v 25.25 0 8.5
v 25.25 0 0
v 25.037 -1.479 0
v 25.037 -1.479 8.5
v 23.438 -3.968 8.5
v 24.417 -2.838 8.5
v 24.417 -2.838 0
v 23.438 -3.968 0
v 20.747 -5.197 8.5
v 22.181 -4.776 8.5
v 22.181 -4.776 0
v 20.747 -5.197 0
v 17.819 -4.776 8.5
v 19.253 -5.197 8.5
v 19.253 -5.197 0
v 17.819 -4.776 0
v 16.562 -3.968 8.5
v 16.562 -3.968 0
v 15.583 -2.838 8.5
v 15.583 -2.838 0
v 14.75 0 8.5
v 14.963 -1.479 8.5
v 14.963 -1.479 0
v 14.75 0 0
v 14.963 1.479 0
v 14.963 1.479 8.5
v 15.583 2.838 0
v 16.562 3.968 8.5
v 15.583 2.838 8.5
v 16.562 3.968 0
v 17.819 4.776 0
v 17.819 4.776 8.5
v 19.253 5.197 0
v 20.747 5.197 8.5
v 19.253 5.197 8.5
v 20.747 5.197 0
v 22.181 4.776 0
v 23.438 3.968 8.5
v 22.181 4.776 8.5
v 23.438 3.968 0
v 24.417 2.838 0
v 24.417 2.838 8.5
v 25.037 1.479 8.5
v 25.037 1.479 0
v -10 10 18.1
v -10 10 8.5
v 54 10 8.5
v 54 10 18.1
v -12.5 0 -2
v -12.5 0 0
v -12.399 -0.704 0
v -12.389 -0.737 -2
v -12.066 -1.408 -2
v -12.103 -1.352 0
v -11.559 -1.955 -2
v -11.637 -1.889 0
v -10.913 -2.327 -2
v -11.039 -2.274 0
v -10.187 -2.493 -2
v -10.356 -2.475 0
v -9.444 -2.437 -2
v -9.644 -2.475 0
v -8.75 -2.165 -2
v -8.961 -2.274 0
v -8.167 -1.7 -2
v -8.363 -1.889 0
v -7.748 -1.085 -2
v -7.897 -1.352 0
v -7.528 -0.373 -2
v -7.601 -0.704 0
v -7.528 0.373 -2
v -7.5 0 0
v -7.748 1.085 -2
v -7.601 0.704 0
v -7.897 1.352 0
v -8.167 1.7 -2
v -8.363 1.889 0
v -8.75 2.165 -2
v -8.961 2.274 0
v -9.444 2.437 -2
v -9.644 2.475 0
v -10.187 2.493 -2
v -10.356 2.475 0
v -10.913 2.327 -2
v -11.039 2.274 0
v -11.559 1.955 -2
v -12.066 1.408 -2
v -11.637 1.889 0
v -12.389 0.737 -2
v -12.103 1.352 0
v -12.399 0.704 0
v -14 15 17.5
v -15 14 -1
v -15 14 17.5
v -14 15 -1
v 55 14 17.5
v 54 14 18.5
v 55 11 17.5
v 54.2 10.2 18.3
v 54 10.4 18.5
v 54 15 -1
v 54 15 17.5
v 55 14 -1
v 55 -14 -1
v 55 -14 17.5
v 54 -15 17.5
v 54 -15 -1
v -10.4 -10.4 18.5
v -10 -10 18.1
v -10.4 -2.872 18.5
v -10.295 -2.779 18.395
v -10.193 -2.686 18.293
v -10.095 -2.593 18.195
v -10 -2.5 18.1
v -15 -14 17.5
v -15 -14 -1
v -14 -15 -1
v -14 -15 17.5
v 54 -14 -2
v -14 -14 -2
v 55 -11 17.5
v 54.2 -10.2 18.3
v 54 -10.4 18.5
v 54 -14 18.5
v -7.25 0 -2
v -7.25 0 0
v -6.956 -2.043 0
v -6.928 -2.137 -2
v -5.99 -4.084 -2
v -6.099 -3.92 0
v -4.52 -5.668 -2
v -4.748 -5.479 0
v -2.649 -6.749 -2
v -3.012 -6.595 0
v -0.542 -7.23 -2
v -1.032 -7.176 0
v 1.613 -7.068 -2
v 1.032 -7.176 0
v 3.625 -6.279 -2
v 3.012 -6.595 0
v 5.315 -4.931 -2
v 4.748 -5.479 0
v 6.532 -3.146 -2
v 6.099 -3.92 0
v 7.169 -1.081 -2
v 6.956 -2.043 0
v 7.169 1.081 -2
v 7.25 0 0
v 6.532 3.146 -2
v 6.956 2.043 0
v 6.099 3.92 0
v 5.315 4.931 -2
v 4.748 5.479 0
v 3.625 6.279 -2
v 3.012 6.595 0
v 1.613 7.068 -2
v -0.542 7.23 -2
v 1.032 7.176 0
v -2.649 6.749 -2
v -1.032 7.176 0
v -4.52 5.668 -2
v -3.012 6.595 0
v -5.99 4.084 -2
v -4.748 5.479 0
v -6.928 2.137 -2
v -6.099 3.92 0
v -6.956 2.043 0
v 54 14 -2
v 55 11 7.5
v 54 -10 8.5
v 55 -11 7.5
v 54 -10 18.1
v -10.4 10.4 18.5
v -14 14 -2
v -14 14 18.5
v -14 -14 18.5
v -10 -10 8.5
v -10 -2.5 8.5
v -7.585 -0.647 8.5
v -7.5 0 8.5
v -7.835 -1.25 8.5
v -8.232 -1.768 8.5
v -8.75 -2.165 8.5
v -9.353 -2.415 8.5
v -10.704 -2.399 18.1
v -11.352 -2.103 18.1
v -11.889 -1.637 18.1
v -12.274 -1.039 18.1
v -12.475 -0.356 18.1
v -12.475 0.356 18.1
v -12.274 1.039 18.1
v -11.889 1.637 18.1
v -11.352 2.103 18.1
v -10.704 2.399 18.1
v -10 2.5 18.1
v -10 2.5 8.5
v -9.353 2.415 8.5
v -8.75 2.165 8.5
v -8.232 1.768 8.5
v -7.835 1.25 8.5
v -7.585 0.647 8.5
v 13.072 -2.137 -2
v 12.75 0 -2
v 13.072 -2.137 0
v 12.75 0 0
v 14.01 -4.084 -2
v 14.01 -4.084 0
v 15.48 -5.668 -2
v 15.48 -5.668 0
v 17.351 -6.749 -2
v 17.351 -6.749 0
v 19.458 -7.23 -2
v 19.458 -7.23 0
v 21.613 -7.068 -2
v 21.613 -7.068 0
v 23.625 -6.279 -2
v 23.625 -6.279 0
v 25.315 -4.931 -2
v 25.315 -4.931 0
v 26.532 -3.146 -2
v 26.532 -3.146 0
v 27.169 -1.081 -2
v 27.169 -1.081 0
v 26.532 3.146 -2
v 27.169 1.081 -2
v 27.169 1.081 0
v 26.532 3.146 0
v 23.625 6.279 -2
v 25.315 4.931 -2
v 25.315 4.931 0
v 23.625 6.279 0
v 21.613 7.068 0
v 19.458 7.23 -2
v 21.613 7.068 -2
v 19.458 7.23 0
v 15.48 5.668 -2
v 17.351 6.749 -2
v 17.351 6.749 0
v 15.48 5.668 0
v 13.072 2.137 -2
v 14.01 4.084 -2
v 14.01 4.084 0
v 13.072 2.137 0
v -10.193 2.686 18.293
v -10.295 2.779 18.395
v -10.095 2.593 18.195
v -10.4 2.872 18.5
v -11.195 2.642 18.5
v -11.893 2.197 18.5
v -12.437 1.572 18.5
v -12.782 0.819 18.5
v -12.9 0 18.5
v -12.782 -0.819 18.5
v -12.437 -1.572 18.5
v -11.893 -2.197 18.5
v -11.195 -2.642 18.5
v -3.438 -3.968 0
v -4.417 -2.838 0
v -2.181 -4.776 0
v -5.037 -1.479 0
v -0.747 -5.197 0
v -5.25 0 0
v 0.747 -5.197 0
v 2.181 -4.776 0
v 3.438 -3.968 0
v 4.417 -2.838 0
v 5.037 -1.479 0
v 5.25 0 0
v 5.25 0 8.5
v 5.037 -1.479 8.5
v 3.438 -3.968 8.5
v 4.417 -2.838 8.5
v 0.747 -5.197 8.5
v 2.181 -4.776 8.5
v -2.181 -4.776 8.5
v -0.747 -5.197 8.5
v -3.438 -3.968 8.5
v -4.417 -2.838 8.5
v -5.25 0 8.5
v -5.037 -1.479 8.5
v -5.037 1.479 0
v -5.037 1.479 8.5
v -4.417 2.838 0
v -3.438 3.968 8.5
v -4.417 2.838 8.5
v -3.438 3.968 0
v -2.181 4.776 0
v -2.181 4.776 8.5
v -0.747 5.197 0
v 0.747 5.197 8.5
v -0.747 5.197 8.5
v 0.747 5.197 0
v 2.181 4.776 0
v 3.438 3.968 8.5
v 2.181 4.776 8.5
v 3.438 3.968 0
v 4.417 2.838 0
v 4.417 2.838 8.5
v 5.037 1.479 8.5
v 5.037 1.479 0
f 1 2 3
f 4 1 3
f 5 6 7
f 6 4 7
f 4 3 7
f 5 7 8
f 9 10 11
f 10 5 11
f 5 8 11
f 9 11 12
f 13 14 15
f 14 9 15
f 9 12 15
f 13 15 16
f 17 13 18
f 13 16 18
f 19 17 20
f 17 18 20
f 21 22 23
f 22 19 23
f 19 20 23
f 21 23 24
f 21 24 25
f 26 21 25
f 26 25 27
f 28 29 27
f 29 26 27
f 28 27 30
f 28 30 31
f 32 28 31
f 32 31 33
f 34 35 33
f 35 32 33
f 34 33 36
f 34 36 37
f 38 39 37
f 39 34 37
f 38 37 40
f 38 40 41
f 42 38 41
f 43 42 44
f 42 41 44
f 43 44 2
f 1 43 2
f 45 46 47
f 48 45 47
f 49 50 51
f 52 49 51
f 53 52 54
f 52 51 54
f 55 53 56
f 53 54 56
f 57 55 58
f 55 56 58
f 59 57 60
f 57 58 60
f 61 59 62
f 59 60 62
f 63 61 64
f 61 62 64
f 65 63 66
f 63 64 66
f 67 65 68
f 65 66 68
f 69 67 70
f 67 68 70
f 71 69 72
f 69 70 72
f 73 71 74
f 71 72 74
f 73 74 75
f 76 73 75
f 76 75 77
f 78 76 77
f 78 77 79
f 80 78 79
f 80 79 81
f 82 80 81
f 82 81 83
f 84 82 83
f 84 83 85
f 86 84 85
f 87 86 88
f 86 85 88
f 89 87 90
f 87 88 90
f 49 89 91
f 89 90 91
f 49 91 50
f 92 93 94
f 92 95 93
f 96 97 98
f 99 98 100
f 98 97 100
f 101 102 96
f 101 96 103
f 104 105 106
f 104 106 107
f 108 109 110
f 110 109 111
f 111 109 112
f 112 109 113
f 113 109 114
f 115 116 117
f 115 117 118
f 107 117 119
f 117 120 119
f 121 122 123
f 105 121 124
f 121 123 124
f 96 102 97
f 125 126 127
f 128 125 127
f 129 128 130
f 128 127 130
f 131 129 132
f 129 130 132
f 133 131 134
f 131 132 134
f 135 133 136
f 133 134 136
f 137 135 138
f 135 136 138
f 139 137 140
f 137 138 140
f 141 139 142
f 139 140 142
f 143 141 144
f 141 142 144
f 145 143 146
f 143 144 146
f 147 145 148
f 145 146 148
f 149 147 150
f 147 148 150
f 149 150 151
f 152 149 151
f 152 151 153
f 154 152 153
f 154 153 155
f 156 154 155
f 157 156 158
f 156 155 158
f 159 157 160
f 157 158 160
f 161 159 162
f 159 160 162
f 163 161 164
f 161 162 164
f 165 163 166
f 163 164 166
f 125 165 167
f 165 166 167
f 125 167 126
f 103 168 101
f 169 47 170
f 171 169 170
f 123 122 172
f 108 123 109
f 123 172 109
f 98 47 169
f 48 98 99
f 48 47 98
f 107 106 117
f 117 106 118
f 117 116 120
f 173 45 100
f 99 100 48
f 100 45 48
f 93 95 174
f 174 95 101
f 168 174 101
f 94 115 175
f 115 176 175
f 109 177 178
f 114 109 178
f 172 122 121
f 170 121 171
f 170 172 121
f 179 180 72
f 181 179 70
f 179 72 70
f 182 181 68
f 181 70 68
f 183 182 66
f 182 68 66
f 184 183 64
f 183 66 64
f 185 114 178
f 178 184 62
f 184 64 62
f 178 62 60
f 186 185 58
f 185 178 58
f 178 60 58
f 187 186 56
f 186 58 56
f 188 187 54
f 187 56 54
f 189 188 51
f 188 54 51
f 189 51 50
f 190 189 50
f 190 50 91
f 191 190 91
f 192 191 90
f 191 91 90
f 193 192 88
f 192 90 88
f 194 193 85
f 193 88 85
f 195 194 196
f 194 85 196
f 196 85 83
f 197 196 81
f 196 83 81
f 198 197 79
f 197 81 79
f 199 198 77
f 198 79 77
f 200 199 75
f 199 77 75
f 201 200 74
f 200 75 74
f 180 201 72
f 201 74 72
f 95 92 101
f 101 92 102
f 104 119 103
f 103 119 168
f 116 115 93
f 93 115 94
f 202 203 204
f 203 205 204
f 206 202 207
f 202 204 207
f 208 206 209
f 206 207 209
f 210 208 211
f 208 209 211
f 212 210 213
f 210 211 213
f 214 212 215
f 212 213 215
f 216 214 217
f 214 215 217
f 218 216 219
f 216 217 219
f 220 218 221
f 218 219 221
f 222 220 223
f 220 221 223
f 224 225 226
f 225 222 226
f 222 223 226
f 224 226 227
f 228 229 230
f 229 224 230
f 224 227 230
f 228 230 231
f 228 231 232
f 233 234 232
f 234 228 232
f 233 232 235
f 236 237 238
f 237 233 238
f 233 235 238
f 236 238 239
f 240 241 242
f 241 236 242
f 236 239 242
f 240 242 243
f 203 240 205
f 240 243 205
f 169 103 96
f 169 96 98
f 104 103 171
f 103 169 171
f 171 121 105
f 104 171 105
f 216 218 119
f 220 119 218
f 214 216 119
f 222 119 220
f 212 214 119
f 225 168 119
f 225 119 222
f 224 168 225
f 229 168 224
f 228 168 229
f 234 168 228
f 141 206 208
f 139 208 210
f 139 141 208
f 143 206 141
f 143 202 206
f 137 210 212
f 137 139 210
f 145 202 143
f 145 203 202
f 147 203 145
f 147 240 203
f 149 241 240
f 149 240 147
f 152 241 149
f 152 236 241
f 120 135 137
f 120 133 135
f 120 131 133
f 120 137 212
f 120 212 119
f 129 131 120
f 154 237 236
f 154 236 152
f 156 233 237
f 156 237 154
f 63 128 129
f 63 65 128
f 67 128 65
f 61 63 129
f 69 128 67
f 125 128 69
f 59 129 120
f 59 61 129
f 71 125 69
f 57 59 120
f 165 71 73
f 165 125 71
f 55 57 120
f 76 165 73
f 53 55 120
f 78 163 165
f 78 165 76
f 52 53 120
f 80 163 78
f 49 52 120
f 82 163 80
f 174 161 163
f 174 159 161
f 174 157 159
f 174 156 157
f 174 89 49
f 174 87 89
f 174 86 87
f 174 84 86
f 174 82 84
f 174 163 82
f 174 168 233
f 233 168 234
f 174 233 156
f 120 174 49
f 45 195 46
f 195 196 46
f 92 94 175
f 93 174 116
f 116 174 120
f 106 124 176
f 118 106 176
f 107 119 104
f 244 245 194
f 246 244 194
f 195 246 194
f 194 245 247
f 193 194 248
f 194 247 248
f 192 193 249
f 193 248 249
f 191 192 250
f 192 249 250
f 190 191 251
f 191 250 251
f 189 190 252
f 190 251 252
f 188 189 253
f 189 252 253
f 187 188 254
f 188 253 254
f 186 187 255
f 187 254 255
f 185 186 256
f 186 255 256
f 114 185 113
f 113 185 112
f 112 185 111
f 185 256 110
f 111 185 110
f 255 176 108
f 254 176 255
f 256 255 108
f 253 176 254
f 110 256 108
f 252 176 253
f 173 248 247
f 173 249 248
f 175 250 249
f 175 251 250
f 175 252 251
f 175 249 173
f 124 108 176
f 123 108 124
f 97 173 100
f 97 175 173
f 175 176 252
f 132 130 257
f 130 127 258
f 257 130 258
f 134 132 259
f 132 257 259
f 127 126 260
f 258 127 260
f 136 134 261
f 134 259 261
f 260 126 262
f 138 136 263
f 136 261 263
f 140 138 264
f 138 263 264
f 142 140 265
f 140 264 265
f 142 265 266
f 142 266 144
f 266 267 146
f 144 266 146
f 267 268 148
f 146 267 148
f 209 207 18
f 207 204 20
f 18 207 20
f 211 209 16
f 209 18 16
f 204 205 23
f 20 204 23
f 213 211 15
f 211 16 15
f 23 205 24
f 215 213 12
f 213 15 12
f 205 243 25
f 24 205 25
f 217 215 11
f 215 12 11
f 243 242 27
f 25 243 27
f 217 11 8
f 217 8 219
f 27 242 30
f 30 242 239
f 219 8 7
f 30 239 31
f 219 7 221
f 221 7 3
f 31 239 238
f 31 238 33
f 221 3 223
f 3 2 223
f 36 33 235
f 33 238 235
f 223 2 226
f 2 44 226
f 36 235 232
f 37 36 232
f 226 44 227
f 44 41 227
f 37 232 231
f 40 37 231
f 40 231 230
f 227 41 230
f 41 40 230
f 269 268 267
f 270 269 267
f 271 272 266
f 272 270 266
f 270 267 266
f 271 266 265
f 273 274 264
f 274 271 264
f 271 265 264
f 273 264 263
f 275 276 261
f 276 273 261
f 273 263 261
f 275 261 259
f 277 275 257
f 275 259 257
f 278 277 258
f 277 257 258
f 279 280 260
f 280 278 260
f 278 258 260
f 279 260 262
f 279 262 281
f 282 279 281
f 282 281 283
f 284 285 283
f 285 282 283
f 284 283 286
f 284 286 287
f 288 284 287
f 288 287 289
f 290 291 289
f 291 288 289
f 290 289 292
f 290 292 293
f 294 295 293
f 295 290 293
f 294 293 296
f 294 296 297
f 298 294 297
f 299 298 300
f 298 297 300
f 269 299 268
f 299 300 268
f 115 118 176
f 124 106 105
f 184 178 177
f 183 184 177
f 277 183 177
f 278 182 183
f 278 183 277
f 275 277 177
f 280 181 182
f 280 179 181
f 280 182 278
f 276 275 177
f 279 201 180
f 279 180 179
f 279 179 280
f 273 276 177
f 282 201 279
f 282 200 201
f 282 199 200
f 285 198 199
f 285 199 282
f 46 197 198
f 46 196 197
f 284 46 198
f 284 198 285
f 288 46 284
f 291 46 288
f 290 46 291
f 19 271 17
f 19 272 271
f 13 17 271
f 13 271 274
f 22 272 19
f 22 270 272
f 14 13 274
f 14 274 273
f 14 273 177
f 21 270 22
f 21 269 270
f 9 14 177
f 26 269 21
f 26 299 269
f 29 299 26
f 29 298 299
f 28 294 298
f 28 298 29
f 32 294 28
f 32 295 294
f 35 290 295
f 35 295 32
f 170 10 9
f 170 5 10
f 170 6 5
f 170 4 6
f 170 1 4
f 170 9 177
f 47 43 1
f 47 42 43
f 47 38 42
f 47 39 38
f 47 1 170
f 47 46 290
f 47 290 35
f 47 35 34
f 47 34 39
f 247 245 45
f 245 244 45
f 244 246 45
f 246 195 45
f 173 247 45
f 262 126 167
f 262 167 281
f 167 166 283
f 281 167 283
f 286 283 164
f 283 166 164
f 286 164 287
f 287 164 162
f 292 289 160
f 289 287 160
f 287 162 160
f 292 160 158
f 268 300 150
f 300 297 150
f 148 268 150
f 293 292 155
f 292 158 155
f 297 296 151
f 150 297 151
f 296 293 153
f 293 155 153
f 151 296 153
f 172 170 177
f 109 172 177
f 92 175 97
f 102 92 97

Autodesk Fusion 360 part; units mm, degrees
sketch "Sketch1" plane through (0, 0, 0) normal (0, 0, 1) x (1, 0, 0)
  circle A0 centre (0, 0) radius 5.25
  line L0 (0, 0) -> (20, 0)
  circle A1 centre (20, 0) radius 5.25
  line L1 (0, 0) -> (-15, 0)
  line L2 (-15, 0) -> (-15, 15)
  line L3 (-15, 0) -> (-15, -15)
  line L4 (-15, -15) -> (55, -15)
  line L5 (-15, 15) -> (55, 15)
  line L6 (55, 15) -> (55, -15)
  circle A2 centre (-10, 0) radius 2.5
  dimension "d1" = 10.5
  dimension "d2" = 20
  dimension "d3" = 10.5
  dimension "d4" = 15
  dimension "d5" = 15
  dimension "d6" = 15
  dimension "d7" = 70
  dimension "d8" = 5
extrude "Extrude1" add sketch "Sketch1" along normal blind 8.5
sketch "Sketch2" plane through (0, 0, 8.5) normal (0, 0, 1) x (1, 0, 0)
  circle A0 centre (0, 0) radius 5.25
  circle A1 centre (-10, 0) radius 2.5
  circle A2 centre (20, 0) radius 5.25
  line L0 (-15, 15) -> (-15, -15)
  line L1 (-15, -15) -> (55, -15)
  line L2 (55, -15) -> (55, 15)
  line L3 (55, 15) -> (-15, 15)
  line L4 (-10, 10) -> (55, 10)
  line L5 (55, 10) -> (55, -10)
  line L6 (55, -10) -> (-10, -10)
  line L7 (-10, -10) -> (-10, 10)
  dimension "d11" = 20
  dimension "d12" = 65
extrude "Extrude2" add sketch "Sketch2" along normal blind 10 contours A1 L0 L1 L2 L3 L4 L6 L7
sketch "Sketch3" plane through (0, 0, 0) normal (0, 0, -1) x (-1, 0, 0)
  circle A0 centre (0, 0) radius 5.25
  circle A1 centre (10, 0) radius 2.5
  circle A2 centre (-20, 0) radius 5.25
  line L0 (15, -15) -> (15, 15)
  line L1 (15, 15) -> (-55, 15)
  line L2 (-55, 15) -> (-55, -15)
  line L3 (-55, -15) -> (15, -15)
  circle A3 centre (-20, 0) radius 7.25
  circle A4 centre (0, 0) radius 7.25
  dimension "d15" = 14.5
  dimension "d16" = 14.5
extrude "Extrude3" add sketch "Sketch3" along normal blind 2 contours L0 L1 L2 L3
chamfer "Chamfer1" distance 1 angle 45 16 edges at (20, 15, -2) (-15, 15, 8.25) (-15, 0, -2) (-15, -15, 8.25) (20, -15, -2) (55, 0, -2) (20, -15, 18.5) (-15, 0, 18.5) (20, 15, 18.5) (55, 15, 8.25) (55, -15, 8.25) (55, -12.5, 18.5) (55, 12.5, 18.5) (55, -10, 13.5) (55, 0, 8.5) (55, 10, 13.5)
chamfer "Chamfer2" distance 0.4 angle 45 5 edges at (22, -10, 18.5) (-10, -6.25, 18.5) (-12.5, 0, 18.5) (-10, 6.25, 18.5) (22, 10, 18.5)
